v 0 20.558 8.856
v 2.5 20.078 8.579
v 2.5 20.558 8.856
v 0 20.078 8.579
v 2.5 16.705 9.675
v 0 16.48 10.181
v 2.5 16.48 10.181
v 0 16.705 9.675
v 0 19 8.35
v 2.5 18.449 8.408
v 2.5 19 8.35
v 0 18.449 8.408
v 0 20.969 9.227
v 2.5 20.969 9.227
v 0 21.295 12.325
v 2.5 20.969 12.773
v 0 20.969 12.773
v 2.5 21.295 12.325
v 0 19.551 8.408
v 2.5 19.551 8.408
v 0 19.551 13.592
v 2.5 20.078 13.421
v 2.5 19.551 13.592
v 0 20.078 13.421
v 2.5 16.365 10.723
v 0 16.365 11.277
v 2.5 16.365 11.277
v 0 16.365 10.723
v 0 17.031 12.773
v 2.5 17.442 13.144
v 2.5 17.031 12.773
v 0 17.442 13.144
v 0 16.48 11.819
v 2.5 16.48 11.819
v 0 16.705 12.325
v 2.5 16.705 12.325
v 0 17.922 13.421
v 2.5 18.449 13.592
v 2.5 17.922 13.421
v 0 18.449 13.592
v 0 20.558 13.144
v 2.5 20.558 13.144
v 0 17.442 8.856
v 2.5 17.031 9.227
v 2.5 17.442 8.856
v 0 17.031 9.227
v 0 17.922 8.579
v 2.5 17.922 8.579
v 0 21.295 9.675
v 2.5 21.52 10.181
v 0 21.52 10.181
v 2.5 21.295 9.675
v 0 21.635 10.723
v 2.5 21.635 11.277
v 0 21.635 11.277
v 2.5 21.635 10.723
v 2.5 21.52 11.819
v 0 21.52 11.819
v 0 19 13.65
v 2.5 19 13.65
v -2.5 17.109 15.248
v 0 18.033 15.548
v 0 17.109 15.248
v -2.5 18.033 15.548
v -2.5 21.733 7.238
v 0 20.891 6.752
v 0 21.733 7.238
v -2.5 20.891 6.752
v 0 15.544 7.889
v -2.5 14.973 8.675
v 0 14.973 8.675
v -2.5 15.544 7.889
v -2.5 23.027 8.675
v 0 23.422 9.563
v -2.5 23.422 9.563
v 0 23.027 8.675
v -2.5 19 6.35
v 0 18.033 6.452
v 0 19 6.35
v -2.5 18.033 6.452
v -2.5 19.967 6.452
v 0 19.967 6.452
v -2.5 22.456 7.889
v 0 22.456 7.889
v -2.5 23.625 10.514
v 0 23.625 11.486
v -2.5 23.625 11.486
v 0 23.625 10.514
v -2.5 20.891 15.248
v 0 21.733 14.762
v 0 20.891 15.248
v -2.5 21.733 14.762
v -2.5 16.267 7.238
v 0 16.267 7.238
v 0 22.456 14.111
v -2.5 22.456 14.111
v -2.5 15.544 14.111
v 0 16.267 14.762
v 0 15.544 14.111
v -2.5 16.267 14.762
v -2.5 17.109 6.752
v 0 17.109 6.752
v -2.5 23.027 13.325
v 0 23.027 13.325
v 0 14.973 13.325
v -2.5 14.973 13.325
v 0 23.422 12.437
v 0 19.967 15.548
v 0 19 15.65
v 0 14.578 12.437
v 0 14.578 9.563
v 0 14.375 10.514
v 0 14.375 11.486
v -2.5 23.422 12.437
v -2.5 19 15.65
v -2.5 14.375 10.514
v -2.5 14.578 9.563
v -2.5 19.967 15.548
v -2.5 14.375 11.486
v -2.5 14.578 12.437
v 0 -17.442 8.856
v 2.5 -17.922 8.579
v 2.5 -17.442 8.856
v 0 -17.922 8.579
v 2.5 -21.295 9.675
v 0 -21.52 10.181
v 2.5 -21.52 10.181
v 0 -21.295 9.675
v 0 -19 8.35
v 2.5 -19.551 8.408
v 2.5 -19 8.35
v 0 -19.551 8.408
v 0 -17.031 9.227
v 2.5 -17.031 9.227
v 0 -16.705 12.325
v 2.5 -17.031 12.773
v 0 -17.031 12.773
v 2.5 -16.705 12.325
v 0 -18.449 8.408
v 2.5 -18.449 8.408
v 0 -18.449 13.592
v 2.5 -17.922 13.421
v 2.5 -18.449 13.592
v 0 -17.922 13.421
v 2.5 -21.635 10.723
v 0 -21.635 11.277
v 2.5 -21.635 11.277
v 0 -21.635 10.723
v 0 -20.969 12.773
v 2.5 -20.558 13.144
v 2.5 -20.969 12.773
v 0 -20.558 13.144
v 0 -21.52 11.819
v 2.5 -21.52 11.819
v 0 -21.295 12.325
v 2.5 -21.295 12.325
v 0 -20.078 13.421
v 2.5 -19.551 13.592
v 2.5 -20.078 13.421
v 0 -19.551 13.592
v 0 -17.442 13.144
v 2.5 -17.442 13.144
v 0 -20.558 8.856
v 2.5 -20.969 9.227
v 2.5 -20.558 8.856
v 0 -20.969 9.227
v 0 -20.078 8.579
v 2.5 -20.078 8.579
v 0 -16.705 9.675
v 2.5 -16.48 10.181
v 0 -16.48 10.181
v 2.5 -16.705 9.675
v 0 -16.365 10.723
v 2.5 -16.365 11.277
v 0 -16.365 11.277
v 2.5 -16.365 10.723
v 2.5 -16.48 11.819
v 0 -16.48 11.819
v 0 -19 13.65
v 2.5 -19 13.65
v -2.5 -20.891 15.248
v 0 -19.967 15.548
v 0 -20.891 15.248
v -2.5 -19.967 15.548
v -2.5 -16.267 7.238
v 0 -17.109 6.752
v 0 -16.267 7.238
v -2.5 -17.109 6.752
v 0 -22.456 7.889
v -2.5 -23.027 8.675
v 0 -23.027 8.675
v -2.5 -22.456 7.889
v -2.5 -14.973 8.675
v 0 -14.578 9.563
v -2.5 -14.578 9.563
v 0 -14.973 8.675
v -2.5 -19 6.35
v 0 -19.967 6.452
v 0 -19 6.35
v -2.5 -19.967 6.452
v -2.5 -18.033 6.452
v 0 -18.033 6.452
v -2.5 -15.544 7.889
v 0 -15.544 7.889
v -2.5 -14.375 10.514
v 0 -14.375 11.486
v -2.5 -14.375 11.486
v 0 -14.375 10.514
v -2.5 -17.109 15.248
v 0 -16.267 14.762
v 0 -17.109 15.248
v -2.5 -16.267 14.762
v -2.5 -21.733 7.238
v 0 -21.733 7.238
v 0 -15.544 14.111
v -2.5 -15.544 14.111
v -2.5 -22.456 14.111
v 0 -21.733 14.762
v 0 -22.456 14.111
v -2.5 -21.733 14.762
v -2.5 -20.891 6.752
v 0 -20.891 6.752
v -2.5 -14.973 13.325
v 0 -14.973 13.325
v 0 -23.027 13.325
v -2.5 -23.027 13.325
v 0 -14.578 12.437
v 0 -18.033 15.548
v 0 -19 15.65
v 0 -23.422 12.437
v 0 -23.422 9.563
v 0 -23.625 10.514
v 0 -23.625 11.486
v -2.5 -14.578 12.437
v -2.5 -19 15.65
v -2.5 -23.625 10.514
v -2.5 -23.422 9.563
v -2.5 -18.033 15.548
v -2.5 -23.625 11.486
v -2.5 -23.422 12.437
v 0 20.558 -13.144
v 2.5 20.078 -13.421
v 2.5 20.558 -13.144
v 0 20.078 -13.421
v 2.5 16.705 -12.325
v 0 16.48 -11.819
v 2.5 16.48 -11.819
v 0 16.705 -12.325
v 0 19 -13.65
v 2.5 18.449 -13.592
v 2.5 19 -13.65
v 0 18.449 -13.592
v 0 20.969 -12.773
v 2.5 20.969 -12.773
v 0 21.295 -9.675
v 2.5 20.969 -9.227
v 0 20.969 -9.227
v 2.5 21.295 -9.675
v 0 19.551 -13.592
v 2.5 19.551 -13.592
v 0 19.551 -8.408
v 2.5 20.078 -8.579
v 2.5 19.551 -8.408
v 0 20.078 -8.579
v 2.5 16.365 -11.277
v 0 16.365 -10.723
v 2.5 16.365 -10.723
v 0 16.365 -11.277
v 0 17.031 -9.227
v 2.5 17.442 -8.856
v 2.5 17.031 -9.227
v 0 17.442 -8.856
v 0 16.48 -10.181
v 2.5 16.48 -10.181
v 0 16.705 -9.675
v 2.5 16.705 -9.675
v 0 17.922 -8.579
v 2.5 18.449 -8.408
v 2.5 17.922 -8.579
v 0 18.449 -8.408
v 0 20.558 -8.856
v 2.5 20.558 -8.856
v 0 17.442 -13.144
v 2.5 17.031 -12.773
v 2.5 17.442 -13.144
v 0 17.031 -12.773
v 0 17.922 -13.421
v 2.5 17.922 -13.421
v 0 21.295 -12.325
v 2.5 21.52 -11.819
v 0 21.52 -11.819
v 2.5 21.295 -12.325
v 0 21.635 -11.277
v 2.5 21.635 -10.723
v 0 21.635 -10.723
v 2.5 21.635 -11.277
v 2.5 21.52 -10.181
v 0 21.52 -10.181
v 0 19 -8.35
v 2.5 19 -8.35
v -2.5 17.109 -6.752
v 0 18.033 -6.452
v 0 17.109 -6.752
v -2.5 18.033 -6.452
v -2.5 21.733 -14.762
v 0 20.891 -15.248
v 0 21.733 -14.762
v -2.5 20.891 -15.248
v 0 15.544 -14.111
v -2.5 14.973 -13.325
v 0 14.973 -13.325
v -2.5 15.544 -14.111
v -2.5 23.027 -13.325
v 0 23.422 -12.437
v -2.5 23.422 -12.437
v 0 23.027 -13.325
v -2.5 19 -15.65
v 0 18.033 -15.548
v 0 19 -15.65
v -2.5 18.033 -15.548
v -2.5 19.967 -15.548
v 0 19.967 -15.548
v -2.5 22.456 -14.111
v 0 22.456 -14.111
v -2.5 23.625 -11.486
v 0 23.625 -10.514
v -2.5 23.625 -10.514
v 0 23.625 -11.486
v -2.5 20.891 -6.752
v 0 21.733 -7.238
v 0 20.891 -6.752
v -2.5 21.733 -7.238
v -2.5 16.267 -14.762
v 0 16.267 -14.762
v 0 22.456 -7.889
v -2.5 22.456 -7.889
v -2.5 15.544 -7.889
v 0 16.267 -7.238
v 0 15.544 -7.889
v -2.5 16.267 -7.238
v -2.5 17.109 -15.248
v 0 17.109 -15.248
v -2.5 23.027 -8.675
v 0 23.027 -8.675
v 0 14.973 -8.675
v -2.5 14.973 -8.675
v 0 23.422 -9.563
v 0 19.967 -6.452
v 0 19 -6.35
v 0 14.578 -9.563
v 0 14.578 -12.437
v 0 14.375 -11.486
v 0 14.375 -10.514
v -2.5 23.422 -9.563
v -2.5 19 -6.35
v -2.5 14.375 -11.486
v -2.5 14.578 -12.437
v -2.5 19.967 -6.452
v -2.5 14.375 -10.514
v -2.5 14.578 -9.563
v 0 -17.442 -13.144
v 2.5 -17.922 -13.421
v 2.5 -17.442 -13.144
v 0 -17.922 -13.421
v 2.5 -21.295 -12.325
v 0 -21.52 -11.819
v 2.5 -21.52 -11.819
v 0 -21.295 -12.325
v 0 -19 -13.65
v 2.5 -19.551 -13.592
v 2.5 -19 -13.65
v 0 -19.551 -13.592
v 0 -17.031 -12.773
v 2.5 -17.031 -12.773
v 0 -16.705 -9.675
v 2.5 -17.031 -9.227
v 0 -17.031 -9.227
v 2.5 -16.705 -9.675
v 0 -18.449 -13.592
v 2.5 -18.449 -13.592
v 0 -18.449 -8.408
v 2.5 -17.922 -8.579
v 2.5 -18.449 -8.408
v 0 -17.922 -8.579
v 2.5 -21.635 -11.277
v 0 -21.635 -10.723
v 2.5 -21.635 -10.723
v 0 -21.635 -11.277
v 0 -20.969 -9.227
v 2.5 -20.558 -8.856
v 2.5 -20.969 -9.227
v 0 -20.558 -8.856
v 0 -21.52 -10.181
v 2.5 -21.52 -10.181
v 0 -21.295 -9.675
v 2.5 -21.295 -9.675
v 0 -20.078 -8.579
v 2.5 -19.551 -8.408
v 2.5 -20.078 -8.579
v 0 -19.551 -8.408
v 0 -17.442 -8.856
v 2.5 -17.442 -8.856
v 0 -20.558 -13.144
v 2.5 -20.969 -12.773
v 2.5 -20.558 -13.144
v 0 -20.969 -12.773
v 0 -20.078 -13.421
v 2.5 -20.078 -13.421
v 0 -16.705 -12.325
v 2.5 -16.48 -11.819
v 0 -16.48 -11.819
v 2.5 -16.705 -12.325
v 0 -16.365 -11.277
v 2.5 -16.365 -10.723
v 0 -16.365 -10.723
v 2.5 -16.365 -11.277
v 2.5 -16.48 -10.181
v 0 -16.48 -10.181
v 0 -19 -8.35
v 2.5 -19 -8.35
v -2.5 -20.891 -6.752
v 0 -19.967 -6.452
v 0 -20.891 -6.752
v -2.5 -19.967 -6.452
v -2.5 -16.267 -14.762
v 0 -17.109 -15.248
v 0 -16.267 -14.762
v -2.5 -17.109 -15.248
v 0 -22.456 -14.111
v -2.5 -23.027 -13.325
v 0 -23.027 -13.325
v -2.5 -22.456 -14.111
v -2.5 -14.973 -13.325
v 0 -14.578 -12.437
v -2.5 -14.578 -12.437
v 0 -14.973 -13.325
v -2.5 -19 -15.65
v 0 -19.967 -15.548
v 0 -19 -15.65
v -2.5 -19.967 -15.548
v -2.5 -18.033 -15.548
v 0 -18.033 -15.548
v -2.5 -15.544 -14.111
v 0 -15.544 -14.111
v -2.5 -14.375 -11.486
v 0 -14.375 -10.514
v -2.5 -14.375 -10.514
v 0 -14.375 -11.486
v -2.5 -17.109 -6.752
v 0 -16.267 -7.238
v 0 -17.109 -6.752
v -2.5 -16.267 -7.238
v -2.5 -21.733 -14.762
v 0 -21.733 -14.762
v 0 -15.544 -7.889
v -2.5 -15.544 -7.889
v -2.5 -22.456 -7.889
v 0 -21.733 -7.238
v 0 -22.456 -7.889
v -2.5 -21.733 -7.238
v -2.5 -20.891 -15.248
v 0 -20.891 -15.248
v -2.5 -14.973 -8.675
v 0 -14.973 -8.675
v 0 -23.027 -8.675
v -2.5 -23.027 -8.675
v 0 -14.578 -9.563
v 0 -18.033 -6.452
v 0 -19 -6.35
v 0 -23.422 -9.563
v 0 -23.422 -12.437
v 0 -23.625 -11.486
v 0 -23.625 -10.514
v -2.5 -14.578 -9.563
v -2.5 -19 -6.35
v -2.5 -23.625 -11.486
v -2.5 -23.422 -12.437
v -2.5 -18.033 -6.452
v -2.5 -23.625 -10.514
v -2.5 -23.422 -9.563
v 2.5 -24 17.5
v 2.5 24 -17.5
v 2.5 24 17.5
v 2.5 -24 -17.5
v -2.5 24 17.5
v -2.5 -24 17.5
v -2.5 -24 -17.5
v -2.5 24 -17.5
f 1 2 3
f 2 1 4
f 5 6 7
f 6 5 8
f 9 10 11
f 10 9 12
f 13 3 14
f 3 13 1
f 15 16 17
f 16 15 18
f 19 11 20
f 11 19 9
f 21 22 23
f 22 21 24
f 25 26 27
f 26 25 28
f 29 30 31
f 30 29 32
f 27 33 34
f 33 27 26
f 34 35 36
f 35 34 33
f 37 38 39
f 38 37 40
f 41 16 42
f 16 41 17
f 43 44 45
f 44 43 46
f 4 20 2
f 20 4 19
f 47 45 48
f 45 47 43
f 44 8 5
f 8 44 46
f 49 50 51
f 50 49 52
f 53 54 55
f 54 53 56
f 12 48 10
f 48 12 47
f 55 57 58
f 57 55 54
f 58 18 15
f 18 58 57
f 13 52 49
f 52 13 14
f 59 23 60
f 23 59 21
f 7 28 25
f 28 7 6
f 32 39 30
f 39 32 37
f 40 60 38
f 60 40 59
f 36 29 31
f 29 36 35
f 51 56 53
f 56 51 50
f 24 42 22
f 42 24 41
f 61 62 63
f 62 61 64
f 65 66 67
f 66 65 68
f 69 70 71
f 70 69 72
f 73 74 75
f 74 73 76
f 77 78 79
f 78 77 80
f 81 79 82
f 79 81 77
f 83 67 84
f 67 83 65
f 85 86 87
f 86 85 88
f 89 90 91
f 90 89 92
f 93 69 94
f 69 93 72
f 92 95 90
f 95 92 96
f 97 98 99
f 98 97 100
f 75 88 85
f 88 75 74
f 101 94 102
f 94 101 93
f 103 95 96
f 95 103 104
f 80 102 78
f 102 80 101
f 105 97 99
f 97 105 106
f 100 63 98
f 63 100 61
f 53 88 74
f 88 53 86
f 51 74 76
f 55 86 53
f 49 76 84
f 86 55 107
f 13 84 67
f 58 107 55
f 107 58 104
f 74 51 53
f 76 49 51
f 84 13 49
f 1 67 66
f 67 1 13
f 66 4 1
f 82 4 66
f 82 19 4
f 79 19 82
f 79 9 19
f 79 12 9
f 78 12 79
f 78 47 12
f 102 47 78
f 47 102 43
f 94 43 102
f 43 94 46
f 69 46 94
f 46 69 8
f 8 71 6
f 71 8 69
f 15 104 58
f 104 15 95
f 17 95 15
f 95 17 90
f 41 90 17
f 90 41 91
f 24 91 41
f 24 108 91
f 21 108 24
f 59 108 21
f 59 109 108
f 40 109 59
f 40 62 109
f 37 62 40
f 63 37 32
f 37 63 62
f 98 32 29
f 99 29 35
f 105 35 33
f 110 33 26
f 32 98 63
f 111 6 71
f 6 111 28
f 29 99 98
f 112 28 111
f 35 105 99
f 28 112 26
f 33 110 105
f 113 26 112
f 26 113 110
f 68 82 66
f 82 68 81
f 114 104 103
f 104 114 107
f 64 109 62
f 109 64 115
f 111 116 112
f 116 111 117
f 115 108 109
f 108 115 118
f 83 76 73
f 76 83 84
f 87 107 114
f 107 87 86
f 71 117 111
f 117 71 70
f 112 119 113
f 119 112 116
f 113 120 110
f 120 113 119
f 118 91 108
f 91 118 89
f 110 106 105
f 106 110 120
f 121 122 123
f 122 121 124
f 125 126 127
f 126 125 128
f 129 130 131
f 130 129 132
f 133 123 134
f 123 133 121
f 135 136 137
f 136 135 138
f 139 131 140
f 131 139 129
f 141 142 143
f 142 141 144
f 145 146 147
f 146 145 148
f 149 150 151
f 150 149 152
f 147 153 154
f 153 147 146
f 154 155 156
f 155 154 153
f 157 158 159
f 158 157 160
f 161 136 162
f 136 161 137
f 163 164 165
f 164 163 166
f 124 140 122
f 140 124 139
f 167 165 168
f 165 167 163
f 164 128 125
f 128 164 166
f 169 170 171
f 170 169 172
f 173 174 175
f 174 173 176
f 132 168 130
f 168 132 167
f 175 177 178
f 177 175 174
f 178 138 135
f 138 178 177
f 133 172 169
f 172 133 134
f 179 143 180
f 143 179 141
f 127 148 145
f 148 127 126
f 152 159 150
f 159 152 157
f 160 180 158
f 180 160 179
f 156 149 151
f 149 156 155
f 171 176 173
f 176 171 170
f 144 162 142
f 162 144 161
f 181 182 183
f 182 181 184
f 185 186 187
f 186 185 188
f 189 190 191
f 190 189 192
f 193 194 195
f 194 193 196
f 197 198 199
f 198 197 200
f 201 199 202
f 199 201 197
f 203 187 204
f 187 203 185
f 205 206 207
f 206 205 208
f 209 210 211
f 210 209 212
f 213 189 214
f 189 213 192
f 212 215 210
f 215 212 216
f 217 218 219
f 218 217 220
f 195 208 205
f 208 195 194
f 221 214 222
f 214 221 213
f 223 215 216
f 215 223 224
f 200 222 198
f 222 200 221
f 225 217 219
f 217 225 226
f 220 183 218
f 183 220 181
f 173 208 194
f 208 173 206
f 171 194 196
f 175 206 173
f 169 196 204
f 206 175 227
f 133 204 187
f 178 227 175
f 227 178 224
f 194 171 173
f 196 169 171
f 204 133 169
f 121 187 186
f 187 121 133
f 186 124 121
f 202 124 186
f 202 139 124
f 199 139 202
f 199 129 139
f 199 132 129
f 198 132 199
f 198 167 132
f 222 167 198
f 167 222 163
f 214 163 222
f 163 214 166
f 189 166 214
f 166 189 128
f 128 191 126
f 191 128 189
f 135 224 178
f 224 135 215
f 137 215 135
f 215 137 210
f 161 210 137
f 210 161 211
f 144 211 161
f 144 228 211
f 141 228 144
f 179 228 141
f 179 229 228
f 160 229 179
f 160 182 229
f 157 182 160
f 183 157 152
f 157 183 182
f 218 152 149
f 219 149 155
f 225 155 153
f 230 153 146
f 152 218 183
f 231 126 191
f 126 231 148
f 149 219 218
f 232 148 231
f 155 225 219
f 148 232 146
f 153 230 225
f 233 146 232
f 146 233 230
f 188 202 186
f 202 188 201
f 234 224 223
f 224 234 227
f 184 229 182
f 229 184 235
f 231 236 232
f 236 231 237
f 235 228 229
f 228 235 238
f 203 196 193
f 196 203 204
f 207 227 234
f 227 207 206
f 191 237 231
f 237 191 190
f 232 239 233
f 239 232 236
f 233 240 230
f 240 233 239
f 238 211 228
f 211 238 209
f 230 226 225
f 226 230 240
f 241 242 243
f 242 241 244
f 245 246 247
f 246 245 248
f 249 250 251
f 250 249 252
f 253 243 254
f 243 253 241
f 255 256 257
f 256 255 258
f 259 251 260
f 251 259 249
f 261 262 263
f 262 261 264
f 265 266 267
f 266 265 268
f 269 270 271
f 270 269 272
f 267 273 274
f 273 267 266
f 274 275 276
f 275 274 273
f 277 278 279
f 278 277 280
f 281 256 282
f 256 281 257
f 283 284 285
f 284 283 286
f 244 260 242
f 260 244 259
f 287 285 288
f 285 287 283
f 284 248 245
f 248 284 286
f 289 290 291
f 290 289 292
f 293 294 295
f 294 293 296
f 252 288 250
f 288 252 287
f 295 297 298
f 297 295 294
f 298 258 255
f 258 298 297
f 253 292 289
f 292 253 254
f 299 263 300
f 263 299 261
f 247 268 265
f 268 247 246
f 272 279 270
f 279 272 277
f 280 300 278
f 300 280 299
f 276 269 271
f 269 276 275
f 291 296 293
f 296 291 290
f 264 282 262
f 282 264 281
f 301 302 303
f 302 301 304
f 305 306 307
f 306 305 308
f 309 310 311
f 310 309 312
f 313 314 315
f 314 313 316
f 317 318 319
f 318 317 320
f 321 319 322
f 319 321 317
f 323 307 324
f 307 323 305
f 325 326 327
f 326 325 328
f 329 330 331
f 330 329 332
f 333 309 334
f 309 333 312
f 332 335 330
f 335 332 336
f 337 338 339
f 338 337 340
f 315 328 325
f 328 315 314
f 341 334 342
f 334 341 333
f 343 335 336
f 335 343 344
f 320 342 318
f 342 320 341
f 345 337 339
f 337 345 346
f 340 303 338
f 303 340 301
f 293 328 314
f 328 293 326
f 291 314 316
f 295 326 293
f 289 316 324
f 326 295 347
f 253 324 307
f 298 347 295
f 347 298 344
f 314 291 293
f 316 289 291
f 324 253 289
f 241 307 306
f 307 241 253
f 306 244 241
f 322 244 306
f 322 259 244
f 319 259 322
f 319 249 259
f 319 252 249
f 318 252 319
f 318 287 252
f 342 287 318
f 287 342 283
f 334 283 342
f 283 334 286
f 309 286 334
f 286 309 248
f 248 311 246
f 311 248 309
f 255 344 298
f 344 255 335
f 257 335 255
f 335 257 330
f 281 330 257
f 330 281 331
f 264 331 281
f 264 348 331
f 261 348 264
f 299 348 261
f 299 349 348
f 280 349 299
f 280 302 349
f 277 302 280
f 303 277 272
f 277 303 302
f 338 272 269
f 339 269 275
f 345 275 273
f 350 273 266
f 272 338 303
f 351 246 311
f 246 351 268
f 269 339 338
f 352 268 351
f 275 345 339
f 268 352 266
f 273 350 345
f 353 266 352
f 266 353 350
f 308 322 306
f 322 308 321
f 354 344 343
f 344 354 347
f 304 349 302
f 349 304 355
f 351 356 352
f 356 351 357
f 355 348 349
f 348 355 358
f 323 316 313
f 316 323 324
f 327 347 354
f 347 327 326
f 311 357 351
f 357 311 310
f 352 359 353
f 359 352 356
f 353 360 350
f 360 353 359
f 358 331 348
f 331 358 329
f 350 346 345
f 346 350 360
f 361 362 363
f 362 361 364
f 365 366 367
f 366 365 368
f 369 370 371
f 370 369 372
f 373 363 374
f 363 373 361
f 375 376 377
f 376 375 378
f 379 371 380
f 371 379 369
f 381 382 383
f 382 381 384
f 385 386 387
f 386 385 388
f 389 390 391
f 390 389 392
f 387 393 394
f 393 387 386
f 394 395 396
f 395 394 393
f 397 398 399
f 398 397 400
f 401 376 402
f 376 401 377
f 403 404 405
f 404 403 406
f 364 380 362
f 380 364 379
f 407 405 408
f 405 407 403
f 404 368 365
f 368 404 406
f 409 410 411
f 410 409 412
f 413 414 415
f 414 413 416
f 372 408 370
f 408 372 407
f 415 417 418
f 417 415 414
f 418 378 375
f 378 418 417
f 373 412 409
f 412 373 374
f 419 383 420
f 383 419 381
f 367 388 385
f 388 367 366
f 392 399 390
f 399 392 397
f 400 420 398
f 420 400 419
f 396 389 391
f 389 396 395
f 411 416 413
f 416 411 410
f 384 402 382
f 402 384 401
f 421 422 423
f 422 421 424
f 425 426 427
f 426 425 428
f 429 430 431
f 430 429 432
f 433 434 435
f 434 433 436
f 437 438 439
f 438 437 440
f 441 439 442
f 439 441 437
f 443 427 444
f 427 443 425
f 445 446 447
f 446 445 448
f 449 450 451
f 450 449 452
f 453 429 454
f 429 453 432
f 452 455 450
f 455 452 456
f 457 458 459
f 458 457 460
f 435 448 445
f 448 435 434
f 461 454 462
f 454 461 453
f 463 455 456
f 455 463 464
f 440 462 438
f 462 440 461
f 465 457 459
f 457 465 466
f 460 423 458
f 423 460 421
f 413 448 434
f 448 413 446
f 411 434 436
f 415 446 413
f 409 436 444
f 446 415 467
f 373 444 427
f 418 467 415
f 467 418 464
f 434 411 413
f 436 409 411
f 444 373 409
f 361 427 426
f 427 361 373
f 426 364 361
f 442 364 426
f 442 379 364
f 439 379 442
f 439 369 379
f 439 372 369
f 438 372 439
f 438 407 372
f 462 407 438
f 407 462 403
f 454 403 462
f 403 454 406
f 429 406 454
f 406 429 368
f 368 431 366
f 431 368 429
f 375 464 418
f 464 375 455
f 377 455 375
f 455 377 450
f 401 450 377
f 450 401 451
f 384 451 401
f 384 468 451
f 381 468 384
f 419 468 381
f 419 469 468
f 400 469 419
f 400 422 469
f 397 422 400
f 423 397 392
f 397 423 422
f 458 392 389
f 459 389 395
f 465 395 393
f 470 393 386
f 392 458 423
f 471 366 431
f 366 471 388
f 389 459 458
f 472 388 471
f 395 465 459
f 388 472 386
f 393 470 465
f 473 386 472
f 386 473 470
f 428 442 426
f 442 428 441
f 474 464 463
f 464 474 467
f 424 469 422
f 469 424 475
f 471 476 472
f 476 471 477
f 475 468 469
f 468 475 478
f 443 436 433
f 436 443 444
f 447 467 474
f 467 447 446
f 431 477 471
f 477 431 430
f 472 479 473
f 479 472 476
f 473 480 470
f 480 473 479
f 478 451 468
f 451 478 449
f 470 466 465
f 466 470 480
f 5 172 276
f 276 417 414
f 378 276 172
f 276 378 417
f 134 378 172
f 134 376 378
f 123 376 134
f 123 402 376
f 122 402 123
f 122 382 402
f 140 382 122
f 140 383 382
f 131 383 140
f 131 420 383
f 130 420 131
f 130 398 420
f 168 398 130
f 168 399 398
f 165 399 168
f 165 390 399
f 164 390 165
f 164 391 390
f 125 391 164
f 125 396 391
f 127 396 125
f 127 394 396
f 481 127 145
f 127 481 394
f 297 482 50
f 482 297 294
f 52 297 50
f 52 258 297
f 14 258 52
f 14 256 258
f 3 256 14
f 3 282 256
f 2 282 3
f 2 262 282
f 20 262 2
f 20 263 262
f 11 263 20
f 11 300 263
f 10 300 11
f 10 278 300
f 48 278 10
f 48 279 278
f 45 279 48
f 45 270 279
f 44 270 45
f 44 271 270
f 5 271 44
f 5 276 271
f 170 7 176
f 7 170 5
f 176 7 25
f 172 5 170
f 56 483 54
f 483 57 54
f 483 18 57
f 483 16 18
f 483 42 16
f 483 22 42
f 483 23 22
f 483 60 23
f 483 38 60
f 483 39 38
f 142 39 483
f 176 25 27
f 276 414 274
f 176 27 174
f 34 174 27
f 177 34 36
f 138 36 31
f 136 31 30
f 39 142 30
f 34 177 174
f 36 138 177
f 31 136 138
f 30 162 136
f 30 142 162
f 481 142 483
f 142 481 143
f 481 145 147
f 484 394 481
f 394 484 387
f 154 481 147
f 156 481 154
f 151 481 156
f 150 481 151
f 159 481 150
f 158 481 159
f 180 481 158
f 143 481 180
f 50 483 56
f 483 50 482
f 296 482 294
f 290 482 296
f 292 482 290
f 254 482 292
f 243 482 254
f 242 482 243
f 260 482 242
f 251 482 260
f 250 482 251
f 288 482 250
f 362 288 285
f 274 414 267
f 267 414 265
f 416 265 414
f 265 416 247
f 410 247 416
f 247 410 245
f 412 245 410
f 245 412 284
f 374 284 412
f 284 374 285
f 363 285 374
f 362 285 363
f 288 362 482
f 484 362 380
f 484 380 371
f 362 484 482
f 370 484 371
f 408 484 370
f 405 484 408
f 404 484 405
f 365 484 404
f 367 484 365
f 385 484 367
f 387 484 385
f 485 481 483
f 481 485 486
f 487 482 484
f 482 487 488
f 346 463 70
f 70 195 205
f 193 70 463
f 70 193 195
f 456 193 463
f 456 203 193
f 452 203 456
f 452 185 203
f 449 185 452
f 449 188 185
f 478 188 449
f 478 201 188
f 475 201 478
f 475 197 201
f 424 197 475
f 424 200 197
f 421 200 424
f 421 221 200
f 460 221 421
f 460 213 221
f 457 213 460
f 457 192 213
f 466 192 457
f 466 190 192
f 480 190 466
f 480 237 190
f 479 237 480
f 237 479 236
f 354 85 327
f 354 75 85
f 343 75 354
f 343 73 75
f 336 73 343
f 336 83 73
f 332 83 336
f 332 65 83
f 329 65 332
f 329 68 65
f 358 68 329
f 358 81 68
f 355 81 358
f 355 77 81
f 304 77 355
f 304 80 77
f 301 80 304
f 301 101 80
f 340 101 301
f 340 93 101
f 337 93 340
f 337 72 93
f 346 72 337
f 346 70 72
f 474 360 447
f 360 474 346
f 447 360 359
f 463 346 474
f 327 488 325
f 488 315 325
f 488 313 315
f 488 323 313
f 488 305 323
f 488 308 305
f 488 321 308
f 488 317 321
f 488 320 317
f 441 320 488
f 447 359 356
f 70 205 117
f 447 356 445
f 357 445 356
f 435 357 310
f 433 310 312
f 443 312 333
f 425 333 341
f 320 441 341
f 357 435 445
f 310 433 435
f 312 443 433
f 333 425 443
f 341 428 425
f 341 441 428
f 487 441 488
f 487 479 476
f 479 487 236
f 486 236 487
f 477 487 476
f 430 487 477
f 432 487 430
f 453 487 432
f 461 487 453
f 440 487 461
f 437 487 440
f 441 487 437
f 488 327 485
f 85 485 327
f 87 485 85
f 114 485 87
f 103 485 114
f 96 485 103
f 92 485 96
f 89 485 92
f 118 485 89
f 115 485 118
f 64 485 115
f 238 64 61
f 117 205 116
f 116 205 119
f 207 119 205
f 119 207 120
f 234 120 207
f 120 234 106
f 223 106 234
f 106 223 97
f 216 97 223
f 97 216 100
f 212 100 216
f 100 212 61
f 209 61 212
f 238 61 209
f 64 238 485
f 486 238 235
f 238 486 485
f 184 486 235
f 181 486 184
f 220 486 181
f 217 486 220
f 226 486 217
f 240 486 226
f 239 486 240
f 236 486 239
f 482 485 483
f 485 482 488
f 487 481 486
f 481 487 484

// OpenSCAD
$fn = 30;

M5ShaftDiameter = 5.3;
M5HeadDiameter = 9.3;

M5ThreadInsertDiameter = 4.9;
M5ThreadInsertOutsideDiameter = 4.2;

difference(){
  cube([5,48,35],center=true); // block size
  blockMountHoles();

}

module blockMountHoles(width=38,heigth=22){
  translate([0,width/2,heigth/2]) screw5mm();
  translate([0,-width/2,heigth/2]) screw5mm();
  translate([0,width/2,-heigth/2]) screw5mm();
  translate([0,-width/2,-heigth/2]) screw5mm();
}

module screw5mm(){
	color("Green") rotate([0,90,0]) cylinder(d=M5ShaftDiameter,h=20,center=true);
  color("Green") translate([-5,0,0]) rotate([0,90,0]) cylinder(d=M5HeadDiameter,h=10,center=true);
}
